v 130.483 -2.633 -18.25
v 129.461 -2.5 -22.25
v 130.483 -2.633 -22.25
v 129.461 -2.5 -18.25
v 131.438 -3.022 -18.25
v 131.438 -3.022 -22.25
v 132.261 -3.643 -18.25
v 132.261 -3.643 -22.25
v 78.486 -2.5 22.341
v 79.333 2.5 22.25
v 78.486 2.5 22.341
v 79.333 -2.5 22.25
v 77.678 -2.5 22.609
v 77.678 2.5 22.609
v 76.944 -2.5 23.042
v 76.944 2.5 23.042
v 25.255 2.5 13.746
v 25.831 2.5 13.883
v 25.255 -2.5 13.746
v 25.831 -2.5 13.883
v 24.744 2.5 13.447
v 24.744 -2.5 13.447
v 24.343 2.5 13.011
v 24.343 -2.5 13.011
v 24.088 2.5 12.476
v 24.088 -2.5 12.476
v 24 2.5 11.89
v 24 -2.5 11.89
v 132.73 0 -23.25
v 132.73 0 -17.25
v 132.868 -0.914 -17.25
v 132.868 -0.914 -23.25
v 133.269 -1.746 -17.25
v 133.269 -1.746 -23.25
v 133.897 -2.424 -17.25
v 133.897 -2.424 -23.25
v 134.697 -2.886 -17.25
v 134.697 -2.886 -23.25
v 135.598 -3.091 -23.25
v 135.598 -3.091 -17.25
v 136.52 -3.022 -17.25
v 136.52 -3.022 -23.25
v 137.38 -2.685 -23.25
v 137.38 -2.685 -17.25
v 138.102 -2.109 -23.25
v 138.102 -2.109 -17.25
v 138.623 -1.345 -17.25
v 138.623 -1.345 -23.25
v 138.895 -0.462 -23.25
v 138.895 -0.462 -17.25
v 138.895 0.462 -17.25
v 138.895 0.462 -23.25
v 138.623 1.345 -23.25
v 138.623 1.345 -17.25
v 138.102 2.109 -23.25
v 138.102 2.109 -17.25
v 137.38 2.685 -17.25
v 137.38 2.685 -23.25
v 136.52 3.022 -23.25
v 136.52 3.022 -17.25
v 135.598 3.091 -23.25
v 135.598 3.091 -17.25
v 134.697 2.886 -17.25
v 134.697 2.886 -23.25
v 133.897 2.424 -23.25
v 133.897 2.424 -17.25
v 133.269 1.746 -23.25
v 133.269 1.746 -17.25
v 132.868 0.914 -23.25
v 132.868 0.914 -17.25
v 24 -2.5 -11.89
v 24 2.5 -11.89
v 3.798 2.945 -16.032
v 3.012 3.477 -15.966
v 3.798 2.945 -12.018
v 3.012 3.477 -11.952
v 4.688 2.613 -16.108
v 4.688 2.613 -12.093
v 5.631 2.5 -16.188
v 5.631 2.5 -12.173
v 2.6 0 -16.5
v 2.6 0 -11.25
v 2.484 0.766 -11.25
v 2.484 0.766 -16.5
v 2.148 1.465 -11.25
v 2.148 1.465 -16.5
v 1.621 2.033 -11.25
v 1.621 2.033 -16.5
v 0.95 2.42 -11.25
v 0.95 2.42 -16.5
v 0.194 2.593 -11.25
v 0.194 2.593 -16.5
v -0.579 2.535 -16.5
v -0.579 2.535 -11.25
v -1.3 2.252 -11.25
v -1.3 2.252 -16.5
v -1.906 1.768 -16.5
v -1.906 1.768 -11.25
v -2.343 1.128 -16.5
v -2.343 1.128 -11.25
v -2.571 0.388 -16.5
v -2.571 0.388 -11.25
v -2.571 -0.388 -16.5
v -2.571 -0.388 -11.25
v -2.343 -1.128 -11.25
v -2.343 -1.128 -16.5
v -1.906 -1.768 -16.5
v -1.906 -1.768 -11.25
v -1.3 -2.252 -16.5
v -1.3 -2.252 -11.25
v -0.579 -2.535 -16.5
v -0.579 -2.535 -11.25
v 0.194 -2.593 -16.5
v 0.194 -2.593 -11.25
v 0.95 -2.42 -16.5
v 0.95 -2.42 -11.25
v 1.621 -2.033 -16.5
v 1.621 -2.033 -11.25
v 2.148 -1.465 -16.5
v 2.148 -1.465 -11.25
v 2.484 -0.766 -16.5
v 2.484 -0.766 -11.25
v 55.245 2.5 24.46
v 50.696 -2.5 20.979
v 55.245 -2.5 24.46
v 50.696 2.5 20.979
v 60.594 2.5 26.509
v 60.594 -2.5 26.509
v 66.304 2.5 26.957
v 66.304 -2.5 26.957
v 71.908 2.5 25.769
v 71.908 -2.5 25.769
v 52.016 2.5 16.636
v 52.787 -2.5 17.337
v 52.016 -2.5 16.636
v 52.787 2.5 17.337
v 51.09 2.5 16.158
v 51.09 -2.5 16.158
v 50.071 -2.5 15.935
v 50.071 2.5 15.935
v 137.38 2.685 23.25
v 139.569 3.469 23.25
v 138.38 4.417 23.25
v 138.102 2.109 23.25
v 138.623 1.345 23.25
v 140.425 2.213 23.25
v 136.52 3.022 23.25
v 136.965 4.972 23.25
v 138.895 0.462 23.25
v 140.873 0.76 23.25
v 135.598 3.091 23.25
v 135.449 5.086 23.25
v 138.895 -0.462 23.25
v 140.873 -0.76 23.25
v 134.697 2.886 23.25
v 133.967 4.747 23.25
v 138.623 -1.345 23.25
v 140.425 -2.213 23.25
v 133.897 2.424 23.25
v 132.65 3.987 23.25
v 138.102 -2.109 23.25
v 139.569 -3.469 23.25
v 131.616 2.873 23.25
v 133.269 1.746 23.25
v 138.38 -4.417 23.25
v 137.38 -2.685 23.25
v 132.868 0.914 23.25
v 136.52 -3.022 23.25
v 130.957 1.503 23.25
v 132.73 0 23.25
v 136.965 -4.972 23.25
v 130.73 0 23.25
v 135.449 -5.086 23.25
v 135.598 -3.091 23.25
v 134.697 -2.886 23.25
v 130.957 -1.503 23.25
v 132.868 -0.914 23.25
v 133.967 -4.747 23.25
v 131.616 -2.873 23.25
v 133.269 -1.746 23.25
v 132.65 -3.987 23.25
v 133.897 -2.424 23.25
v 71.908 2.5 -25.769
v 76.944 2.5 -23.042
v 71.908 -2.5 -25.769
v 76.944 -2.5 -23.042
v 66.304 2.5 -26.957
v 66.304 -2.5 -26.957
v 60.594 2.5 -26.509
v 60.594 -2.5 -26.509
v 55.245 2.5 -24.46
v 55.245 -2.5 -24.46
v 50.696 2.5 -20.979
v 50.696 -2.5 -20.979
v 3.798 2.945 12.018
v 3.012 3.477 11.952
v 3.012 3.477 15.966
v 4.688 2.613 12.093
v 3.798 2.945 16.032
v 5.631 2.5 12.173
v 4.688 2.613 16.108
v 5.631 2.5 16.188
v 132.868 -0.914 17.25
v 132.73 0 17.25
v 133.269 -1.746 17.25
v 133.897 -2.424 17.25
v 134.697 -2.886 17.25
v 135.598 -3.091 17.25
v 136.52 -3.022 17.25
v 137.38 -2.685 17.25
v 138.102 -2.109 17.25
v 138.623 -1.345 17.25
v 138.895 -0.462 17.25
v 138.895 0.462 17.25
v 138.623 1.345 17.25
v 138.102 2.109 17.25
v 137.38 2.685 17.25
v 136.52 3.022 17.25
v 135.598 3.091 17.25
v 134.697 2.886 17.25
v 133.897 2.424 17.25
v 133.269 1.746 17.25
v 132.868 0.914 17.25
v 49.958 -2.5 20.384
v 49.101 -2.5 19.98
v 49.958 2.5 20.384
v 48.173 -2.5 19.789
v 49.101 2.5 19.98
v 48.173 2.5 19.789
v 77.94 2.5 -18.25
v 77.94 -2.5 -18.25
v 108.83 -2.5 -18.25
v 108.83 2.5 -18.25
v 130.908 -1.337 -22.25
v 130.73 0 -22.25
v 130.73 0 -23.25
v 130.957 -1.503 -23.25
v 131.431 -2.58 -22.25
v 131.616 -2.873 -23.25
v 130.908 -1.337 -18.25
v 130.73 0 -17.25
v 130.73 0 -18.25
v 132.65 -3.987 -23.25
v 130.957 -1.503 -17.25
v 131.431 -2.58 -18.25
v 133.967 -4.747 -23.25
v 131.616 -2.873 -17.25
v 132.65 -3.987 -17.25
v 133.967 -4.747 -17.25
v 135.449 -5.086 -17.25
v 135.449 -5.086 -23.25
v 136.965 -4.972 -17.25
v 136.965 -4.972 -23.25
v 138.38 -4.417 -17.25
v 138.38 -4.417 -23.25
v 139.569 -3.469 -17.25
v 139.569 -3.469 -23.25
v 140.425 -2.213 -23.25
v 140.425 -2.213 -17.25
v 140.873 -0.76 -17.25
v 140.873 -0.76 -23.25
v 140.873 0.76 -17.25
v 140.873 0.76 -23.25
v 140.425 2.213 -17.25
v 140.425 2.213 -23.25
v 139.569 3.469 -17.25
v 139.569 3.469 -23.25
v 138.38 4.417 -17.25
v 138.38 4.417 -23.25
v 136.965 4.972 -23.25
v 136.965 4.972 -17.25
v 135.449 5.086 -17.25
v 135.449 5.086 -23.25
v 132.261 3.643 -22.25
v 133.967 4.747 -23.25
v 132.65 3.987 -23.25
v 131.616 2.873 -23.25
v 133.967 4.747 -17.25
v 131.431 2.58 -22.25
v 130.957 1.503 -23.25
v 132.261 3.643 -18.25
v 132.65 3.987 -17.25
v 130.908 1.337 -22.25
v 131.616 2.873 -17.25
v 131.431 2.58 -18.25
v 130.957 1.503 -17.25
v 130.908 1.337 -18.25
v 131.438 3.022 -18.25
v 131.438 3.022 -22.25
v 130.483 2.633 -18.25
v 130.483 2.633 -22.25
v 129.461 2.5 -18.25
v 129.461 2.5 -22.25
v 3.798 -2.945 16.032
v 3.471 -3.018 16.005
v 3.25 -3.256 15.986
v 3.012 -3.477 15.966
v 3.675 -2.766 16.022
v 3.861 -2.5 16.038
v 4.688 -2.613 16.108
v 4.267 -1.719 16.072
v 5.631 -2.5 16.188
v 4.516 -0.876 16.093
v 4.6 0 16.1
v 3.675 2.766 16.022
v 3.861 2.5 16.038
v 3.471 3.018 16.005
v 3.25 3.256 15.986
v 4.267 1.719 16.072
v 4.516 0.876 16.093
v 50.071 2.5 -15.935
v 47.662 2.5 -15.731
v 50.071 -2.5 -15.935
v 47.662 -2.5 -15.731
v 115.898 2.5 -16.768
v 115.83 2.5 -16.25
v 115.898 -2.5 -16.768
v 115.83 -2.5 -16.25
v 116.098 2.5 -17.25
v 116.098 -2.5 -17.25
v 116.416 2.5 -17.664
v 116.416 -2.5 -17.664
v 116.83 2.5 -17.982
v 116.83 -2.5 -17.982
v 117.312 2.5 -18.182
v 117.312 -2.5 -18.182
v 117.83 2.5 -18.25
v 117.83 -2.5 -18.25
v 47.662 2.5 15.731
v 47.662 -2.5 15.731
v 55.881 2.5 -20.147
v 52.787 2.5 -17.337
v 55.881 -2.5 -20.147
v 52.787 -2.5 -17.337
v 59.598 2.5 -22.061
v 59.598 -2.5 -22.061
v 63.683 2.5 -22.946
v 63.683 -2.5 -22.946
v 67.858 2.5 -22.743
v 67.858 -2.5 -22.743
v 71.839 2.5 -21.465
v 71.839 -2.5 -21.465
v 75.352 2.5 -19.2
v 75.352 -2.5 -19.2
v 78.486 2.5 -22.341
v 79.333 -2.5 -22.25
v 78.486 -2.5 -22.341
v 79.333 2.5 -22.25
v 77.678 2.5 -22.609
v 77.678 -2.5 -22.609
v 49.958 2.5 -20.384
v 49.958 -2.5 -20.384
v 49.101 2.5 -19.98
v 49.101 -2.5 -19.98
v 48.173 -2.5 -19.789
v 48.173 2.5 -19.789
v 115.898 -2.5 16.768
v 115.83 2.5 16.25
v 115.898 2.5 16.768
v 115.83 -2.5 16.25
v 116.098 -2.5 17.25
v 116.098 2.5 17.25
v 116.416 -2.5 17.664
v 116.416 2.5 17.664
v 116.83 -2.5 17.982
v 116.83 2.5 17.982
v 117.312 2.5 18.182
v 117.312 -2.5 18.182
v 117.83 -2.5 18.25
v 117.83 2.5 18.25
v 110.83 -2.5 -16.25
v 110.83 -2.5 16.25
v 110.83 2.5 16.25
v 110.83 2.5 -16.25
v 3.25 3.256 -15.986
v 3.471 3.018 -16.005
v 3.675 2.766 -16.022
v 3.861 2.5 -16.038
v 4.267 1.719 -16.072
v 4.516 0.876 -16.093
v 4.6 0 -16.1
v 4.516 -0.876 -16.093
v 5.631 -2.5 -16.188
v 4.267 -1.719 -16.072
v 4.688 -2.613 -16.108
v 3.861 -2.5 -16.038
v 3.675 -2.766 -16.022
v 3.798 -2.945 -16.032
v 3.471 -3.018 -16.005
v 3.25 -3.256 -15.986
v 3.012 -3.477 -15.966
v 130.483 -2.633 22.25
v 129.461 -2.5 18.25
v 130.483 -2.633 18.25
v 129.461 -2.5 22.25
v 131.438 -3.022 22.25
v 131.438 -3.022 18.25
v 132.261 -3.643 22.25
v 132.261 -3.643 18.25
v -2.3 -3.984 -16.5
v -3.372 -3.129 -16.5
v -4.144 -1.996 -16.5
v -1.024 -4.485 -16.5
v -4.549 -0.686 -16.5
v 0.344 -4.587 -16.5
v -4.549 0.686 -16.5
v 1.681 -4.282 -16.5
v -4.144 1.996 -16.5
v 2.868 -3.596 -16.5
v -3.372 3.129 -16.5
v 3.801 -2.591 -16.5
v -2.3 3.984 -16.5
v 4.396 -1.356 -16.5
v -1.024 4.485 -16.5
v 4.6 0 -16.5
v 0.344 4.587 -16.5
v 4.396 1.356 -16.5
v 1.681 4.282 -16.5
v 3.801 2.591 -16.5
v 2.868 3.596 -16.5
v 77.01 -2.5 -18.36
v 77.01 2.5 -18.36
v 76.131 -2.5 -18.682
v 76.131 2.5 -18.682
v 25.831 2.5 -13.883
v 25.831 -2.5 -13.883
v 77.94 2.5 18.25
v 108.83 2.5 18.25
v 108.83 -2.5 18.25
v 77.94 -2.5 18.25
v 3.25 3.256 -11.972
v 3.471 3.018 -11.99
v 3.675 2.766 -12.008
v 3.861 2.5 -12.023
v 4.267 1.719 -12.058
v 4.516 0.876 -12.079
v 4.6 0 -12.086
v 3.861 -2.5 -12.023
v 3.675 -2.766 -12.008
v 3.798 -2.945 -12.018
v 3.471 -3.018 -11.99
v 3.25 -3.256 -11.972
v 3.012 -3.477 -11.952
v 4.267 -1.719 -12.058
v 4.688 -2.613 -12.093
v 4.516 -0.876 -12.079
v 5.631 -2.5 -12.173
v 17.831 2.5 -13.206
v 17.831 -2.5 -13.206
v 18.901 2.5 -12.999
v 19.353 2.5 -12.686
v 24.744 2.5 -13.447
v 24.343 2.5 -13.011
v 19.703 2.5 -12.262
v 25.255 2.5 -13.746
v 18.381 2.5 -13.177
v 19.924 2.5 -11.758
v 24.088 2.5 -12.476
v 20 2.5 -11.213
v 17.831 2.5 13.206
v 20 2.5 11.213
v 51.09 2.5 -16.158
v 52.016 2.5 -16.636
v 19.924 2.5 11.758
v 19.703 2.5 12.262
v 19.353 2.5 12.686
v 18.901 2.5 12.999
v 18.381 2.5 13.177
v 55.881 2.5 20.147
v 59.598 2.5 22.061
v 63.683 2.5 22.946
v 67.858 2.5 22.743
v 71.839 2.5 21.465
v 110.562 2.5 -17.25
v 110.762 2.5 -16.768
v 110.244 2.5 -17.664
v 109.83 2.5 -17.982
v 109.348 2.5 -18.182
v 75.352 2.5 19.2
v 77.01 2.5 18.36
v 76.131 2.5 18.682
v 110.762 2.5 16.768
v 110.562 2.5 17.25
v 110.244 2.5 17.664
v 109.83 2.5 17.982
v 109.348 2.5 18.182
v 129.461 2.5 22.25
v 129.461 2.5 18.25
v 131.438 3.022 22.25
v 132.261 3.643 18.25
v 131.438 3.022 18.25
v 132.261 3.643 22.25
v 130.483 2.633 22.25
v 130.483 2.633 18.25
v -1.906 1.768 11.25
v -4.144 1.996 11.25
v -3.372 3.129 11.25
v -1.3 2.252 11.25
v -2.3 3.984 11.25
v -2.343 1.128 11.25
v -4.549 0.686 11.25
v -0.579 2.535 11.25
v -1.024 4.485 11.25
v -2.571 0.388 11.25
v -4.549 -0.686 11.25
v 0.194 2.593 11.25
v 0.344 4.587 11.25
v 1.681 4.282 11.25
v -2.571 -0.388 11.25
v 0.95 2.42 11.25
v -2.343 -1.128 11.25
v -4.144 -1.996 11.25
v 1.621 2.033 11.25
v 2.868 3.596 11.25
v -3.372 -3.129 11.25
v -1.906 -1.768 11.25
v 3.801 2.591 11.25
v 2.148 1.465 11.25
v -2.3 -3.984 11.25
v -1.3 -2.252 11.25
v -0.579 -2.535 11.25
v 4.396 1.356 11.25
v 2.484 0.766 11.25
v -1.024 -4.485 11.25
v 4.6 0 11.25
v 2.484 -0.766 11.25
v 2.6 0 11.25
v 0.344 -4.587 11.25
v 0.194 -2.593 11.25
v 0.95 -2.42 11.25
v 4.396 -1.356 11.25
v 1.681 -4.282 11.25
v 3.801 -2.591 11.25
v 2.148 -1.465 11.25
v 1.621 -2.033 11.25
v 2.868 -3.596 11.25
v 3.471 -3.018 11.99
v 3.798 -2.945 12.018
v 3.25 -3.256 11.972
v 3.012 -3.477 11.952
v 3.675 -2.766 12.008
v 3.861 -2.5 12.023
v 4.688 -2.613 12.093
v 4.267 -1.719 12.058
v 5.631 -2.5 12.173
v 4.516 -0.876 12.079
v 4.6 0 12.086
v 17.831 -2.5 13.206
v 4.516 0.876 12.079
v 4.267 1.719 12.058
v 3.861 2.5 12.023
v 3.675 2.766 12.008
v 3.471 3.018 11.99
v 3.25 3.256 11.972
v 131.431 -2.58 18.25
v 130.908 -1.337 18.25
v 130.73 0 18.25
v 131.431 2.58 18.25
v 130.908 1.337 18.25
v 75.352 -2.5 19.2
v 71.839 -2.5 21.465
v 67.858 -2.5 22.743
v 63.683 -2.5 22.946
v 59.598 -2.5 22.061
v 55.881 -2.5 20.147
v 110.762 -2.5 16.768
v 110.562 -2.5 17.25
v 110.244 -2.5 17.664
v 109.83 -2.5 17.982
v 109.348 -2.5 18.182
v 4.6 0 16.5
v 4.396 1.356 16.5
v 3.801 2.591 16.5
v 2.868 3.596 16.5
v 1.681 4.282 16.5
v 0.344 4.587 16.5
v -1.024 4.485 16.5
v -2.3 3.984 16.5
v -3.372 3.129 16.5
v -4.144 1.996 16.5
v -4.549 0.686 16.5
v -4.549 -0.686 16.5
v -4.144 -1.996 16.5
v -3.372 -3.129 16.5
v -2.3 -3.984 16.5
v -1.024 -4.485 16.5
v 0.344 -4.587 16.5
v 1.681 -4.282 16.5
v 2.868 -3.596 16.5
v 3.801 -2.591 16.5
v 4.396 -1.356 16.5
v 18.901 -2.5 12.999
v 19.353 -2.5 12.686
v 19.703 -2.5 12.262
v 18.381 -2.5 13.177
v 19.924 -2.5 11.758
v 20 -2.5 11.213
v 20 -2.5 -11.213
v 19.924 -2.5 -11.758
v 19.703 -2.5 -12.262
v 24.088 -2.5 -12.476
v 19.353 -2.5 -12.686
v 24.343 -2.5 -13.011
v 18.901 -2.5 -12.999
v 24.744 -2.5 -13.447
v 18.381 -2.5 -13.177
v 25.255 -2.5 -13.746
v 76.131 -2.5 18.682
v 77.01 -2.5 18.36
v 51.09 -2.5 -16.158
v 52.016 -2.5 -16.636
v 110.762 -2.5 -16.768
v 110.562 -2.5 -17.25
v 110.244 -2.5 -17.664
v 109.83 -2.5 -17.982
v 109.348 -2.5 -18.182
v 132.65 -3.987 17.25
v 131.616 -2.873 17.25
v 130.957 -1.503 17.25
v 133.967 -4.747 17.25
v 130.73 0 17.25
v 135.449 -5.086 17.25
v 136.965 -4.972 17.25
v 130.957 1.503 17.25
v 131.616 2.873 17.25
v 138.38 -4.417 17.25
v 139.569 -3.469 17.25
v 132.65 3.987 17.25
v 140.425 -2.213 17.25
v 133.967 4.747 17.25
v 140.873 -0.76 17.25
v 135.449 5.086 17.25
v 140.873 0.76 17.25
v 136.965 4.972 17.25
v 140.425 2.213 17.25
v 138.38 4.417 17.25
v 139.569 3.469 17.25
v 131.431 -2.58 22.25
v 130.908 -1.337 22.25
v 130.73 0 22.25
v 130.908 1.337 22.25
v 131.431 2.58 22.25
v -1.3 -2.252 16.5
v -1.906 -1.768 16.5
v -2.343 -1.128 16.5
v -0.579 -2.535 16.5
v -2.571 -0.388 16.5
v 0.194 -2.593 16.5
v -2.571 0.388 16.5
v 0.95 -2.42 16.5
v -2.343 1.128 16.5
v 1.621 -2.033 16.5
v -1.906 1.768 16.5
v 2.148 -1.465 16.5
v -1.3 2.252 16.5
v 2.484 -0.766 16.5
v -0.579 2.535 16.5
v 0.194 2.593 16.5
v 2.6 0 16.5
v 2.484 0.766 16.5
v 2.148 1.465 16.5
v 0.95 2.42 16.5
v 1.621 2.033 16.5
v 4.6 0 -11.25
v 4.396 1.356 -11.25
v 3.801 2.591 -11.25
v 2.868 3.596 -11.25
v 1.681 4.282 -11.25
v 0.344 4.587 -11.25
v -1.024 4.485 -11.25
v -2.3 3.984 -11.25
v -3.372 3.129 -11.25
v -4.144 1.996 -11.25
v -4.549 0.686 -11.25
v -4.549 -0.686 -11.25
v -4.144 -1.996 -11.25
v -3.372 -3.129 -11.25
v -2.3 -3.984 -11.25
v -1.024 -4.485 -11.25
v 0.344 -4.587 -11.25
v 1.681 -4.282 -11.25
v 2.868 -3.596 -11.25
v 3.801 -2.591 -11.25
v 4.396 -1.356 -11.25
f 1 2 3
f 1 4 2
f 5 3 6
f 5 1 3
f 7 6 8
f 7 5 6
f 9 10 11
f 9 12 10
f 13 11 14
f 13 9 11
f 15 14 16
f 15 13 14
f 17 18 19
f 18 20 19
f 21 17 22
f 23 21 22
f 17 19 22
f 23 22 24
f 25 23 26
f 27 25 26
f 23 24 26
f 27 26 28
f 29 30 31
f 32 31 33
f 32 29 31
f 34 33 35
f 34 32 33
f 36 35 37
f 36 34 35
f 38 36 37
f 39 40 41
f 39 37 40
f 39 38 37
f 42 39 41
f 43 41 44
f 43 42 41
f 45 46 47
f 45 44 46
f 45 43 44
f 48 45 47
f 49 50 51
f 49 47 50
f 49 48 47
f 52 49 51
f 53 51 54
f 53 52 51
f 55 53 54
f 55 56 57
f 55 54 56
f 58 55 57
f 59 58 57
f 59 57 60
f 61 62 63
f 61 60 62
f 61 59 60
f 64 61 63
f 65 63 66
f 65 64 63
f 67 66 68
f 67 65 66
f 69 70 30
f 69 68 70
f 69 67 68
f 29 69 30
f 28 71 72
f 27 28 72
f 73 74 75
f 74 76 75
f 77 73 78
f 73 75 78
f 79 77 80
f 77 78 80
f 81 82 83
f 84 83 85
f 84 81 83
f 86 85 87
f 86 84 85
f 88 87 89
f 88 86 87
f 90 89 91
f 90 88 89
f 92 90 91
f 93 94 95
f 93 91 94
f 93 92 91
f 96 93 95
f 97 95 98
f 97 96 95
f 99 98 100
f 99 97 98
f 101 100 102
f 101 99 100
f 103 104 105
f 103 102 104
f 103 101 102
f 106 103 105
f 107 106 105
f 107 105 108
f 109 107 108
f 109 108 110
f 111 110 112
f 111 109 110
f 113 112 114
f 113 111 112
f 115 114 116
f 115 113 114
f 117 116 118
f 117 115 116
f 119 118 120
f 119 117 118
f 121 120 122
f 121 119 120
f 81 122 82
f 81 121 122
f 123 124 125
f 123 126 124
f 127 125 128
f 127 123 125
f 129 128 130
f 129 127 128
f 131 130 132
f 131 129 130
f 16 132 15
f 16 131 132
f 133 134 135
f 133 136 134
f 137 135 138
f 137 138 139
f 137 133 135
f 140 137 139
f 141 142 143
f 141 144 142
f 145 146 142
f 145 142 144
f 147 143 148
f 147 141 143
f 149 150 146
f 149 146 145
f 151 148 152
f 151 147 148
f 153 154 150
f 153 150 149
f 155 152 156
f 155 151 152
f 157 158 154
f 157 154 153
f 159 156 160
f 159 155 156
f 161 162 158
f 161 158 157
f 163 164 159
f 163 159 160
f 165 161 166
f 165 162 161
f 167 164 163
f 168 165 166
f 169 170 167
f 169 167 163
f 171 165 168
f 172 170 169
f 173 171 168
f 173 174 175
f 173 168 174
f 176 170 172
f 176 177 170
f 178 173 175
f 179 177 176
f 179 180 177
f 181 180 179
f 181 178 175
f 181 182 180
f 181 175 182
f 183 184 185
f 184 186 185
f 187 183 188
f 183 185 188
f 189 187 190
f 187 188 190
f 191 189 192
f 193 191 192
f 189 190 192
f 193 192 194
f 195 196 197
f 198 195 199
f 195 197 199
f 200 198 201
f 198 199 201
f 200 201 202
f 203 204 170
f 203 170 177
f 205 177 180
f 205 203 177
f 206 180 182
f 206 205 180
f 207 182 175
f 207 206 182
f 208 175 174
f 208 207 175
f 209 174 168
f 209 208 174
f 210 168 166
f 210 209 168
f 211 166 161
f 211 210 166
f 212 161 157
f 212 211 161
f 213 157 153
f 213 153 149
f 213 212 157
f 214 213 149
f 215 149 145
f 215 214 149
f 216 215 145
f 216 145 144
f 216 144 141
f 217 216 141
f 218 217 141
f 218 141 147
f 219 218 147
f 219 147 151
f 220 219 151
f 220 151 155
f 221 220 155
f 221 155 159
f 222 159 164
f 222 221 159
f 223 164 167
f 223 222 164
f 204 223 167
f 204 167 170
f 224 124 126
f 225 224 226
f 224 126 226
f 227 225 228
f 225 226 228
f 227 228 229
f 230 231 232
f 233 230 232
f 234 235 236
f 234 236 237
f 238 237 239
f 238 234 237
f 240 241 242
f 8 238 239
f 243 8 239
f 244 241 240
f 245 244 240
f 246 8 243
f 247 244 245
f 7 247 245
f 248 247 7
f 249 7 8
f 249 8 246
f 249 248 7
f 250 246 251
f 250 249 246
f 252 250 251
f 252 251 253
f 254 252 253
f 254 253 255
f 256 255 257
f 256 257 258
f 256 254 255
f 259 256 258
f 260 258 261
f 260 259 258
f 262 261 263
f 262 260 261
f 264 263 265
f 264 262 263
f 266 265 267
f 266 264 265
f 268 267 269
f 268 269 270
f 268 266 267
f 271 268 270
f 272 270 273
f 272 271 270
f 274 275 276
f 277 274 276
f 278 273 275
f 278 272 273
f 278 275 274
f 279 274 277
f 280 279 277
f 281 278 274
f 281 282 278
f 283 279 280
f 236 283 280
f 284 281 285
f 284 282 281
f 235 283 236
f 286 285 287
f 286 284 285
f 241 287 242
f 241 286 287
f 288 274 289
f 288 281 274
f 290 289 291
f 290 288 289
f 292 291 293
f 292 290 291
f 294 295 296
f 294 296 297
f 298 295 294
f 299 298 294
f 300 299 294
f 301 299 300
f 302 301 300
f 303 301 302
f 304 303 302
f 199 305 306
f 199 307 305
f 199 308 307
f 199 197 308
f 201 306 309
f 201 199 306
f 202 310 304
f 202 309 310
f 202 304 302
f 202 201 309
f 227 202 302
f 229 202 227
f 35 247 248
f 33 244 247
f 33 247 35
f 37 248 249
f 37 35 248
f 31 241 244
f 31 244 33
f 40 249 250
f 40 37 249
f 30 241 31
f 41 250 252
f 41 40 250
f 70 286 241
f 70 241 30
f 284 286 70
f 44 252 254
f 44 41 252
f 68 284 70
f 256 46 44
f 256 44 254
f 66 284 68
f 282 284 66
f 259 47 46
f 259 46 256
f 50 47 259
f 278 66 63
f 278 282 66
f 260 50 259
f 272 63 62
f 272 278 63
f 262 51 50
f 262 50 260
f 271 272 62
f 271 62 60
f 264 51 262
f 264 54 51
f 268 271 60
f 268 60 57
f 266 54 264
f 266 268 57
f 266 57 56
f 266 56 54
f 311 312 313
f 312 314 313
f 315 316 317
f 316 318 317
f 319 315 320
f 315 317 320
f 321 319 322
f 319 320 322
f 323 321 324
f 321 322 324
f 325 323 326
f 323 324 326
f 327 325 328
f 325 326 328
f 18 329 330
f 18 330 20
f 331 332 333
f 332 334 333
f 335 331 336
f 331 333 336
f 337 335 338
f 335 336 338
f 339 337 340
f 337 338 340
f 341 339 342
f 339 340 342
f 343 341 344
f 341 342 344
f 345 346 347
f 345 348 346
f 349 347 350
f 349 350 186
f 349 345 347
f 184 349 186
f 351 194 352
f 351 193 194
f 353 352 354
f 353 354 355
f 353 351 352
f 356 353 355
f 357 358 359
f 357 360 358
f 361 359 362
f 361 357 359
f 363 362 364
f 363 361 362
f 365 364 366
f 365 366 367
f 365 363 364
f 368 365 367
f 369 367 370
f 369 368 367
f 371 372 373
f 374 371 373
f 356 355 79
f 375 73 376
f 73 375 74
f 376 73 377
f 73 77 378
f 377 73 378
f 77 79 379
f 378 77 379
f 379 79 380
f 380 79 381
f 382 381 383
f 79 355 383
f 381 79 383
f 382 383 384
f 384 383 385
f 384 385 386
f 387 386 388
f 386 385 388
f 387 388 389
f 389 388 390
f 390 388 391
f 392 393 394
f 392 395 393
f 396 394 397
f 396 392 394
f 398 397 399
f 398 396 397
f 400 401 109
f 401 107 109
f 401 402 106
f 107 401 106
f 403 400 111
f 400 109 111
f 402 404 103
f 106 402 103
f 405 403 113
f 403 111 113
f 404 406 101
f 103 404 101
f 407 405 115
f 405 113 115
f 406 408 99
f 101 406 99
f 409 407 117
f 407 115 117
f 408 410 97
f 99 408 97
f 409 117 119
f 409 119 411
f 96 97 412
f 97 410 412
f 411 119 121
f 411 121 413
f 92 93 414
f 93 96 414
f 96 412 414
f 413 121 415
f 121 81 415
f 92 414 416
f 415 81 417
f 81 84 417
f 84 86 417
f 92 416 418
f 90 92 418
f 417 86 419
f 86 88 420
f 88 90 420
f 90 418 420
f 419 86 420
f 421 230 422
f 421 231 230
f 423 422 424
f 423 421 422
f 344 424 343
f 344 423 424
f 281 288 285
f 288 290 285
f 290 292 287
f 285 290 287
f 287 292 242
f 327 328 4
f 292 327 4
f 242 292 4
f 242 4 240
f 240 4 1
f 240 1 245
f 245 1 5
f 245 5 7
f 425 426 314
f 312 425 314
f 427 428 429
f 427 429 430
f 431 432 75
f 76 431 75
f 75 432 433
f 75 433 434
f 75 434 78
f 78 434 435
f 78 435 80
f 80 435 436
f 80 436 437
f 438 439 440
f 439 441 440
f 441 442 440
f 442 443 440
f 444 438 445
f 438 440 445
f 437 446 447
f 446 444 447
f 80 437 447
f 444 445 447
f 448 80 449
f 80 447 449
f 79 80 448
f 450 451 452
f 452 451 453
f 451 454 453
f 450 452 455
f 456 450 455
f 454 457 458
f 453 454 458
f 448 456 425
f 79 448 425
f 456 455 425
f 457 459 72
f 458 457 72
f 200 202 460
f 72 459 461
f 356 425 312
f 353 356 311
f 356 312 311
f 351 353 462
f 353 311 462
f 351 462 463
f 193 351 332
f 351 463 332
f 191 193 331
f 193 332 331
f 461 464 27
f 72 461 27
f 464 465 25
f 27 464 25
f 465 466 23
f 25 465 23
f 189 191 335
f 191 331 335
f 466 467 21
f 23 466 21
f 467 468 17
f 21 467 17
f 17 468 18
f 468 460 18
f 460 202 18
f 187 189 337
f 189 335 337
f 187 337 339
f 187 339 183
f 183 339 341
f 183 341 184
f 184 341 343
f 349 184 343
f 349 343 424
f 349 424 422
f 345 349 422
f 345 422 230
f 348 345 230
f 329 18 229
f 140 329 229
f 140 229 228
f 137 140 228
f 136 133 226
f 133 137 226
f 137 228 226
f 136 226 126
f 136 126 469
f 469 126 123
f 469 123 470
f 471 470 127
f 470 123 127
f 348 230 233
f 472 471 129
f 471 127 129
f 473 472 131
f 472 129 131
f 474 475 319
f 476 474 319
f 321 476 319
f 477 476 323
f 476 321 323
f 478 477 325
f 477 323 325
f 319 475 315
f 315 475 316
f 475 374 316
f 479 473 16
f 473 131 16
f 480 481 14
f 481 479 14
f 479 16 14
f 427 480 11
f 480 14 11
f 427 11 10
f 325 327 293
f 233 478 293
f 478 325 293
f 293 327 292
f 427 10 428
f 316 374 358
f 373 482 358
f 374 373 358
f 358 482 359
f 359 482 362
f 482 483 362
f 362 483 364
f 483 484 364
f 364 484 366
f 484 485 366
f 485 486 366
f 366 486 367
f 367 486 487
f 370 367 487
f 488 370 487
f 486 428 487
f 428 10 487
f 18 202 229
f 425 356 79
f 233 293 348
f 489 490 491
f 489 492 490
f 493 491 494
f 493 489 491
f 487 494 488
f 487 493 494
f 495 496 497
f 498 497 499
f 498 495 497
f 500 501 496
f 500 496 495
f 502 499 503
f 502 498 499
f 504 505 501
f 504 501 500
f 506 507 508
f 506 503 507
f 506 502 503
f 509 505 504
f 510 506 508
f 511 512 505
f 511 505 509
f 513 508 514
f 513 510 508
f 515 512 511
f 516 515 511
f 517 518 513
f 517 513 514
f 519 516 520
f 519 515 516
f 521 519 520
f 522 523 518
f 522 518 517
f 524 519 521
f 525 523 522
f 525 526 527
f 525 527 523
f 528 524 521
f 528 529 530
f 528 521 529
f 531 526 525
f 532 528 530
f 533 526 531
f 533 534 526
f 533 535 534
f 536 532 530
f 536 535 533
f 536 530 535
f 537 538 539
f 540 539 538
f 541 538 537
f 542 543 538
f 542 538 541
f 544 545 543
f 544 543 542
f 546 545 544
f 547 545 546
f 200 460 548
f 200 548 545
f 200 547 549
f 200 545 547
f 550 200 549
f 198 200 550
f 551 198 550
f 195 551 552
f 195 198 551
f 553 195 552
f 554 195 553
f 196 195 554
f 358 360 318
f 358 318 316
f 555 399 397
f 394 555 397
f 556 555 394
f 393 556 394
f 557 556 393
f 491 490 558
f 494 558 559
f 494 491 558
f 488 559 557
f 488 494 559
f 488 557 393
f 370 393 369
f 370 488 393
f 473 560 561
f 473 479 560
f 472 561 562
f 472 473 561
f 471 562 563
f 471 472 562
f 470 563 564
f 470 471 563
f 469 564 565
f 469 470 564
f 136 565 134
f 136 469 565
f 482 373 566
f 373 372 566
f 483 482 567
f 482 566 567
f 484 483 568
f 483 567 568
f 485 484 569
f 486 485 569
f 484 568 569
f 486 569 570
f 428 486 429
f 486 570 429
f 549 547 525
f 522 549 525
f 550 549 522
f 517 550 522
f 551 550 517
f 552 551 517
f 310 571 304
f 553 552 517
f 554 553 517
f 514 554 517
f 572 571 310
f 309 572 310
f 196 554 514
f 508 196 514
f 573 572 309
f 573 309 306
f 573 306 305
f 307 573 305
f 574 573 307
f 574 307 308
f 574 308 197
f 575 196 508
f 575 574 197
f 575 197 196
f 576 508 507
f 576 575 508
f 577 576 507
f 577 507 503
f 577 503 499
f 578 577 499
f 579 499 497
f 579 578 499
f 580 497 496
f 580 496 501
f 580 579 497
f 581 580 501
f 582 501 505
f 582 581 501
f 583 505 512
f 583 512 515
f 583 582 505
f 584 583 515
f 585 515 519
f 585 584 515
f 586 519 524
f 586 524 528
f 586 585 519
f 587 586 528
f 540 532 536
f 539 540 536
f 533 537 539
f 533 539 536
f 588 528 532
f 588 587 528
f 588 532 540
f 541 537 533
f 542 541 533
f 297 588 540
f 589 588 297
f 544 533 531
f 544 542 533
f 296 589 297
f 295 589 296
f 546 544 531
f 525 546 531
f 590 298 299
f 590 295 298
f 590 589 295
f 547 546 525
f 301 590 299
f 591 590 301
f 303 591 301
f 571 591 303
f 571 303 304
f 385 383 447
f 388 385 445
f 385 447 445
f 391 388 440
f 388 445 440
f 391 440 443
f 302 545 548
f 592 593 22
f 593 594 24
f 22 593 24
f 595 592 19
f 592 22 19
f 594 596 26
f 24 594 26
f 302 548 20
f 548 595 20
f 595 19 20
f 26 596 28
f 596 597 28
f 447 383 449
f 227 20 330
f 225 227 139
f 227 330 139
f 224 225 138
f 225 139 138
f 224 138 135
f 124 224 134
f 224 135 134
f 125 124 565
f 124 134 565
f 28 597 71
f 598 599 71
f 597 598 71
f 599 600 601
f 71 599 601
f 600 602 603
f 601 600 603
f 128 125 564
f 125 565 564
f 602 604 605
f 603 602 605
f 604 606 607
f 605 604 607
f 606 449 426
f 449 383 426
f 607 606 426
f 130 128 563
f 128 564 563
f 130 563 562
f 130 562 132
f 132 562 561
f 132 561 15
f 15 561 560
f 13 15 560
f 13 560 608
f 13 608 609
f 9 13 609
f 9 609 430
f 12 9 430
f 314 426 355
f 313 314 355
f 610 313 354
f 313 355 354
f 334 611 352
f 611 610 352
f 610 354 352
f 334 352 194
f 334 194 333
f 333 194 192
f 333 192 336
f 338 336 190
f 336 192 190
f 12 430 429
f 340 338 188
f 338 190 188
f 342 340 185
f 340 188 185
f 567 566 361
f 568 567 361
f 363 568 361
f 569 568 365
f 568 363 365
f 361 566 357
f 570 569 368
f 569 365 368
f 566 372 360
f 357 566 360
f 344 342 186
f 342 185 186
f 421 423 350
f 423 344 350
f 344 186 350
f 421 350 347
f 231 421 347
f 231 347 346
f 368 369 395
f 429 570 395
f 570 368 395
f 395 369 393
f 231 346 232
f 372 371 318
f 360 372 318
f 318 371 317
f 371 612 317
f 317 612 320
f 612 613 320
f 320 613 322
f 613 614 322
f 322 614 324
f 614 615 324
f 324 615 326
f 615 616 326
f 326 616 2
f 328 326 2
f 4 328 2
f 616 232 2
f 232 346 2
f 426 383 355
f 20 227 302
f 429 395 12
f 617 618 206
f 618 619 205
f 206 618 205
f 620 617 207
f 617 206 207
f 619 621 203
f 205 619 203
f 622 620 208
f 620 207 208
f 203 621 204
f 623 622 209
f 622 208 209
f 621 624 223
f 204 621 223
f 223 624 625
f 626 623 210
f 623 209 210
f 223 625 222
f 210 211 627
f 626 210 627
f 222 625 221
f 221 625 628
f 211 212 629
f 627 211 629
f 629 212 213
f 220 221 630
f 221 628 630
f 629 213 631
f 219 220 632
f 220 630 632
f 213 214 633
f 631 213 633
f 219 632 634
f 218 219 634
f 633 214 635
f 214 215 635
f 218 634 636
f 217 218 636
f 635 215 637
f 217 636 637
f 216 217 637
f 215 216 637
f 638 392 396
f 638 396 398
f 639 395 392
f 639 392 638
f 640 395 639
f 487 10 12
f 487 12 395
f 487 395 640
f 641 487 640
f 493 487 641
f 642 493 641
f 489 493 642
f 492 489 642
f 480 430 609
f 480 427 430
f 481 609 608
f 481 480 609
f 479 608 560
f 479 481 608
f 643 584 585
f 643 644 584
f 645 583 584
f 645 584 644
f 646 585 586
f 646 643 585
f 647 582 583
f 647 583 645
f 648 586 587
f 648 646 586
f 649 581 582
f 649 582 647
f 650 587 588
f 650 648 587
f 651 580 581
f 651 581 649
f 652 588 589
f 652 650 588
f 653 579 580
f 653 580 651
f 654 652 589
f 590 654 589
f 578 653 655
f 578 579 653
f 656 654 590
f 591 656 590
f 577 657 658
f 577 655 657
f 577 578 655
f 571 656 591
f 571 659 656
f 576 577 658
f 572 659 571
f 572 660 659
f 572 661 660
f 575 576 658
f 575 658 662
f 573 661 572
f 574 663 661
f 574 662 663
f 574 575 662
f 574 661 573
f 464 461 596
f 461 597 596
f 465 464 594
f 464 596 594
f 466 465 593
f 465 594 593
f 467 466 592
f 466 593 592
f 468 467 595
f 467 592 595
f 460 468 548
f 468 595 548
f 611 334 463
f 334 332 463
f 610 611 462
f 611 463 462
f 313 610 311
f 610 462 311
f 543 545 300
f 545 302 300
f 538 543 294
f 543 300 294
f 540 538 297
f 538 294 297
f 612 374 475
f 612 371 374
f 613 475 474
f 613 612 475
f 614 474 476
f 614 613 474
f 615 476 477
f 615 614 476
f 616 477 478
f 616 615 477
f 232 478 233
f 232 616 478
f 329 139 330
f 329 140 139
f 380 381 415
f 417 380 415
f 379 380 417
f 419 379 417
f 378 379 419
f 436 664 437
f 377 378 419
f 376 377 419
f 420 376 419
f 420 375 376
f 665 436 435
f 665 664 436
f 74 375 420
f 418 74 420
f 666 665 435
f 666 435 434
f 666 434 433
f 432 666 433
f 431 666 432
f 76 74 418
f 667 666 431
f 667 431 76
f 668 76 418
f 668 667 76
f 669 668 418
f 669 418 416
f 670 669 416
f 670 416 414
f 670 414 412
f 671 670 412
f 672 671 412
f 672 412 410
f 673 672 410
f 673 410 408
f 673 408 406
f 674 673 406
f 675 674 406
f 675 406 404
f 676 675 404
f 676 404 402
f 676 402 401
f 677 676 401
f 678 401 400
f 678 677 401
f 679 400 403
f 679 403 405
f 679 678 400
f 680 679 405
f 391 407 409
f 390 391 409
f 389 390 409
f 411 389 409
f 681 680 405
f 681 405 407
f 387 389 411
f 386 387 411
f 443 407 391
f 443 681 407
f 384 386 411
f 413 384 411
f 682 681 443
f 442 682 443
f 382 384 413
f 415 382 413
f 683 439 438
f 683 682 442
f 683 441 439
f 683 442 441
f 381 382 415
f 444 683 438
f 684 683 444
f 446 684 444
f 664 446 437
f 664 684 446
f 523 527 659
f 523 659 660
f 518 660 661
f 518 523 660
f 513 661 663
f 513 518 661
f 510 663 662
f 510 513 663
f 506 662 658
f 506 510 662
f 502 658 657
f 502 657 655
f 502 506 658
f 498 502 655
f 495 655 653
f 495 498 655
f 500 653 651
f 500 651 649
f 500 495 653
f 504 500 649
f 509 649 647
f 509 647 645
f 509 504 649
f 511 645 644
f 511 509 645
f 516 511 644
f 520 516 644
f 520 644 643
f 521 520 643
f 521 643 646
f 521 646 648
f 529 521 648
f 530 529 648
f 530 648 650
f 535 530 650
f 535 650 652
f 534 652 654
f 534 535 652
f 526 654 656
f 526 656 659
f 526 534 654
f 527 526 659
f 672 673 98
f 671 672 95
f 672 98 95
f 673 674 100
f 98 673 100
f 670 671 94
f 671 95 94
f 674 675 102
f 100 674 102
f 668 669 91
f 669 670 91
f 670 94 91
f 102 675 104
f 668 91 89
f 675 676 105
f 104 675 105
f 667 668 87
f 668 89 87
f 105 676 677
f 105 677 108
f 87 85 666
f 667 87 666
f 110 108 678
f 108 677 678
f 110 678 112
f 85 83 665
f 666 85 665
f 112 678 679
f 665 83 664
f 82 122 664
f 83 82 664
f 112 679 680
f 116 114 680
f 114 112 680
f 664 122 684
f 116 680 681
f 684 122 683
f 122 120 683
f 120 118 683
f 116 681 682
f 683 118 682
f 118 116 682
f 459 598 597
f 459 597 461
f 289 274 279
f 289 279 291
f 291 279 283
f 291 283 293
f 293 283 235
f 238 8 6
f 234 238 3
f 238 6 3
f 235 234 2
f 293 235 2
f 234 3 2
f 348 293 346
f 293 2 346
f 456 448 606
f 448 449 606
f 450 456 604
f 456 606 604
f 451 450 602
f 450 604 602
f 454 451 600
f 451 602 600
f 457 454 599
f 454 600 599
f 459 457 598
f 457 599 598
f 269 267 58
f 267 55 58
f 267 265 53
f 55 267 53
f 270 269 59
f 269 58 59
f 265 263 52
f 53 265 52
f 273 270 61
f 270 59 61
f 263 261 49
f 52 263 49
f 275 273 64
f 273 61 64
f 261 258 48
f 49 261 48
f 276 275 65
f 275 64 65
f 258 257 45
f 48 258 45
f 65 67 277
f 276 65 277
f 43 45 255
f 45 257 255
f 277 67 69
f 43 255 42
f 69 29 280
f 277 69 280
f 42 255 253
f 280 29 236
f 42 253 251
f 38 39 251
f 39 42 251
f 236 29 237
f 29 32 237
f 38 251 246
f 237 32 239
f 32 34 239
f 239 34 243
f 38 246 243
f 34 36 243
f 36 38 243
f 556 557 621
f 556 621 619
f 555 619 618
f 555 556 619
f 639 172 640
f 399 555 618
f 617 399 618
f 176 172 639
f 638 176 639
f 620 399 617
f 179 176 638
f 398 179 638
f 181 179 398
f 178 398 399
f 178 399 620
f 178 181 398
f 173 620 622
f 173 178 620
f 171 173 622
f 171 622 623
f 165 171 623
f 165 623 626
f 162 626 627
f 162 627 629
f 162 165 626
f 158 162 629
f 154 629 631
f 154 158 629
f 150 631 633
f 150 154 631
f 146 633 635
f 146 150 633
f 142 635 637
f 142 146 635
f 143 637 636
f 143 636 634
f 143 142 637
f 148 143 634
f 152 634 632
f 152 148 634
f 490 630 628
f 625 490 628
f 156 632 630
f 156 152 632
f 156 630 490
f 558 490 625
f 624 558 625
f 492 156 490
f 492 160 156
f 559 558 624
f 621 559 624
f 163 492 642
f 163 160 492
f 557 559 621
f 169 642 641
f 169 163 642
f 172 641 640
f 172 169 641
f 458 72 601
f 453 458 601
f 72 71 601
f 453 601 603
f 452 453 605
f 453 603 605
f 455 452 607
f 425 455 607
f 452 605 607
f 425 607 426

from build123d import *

# Parameters (mm, degrees)
SKETCH_1_R          = 4.6
SKETCH_1_R_2        = 2.6
EXTRUDE_1_DEPTH     = 16.5
SKETCH_2_R          = 5.1
SKETCH_2_R_2        = 3.1
EXTRUDE_2_DEPTH     = 23.25
EXTRUDE_3_DEPTH     = 2.5
SKETCH_4_W          = 4
SKETCH_4_H          = 5
EXTRUDE_4_DEPTH     = 14
SKETCH_5_W          = 5
SKETCH_5_H          = 5
EXTRUDE_5_DEPTH     = 21
SKETCH_7_W          = 23.250119988
SKETCH_7_H          = 22.5
SKETCH_7_W_2        = 28.223053091
SKETCH_7_H_2        = 34.5
CUT_EXTRUDE_1_DEPTH = 21
FILLET_1_R          = 2
FILLET_2_R          = 4
FILLET_3_R          = 4


with BuildPart() as part:
    # 草图1 → 凸台-拉伸1 (new, symmetric)
    with BuildSketch(Plane.XY):
        Circle(SKETCH_1_R)
        Circle(SKETCH_1_R_2, mode=Mode.SUBTRACT)
    extrude(amount=EXTRUDE_1_DEPTH, both=True)



with BuildPart() as body_2:
    # 草图2 → 凸台-拉伸2 (new, symmetric)
    with BuildSketch(Plane.XY):
        with Locations(Location((135.83, 0, 0), (0, 0, 180))):
            Circle(SKETCH_2_R)
        with Locations(Location((135.83, 0, 0), (0, 0, 180))):
            Circle(SKETCH_2_R_2, mode=Mode.SUBTRACT)
    extrude(amount=EXTRUDE_2_DEPTH, both=True)


with BuildPart() as part_1:
    add(part.part)

    add(body_2.part)  # 凸台-拉伸3 merges body 2
    # 草图3 → 凸台-拉伸3 (add, symmetric)
    with BuildSketch(Plane(origin=(0, 0, 0), x_dir=(1, 0, 0), z_dir=(0, 1, 0))):
        with BuildLine():
            Line((132.183492931, 22.25), (77.939764295, 22.25))
            ThreePointArc((77.939764295, 22.25), (63.354138409, 26.932163446), (49.734070133, 19.920966887))
            Line((49.734070133, 19.920966887), (3.331299064, 15.992872298))
            Line((3.331299064, 15.992872298), (3.668700936, 12.007127702))
            Line((3.668700936, 12.007127702), (47.661946379, 15.731250754))
            Line((47.661946379, 15.731250754), (51.828770684, 16.083981413))
            ThreePointArc((51.828770684, 16.083981413), (63.593703521, 22.938077996), (76.377060253, 18.25))
            Line((76.377060253, 18.25), (81.535945694, 18.25))
            Line((81.535945694, 18.25), (132.183492931, 18.25))
            Line((132.183492931, 18.25), (132.183492931, 22.25))
        make_face()
        with BuildLine():
            Line((132.183492931, -18.25), (81.535945694, -18.25))
            Line((81.535945694, -18.25), (76.377060253, -18.25))
            ThreePointArc((76.377060253, -18.25), (63.593703521, -22.938077996), (51.828770684, -16.083981413))
            Line((51.828770684, -16.083981413), (47.661946379, -15.731250754))
            Line((47.661946379, -15.731250754), (3.668700936, -12.007127702))
            Line((3.668700936, -12.007127702), (3.331299064, -15.992872298))
            Line((3.331299064, -15.992872298), (49.734070133, -19.920966887))
            ThreePointArc((49.734070133, -19.920966887), (63.354138409, -26.932163446), (77.939764295, -22.25))
            Line((77.939764295, -22.25), (132.183492931, -22.25))
            Line((132.183492931, -22.25), (132.183492931, -18.25))
        make_face()
    extrude(amount=EXTRUDE_3_DEPTH, both=True)

    # 草图4 → 凸台-拉伸4 (add, symmetric)
    with BuildSketch(Plane.XY):
        with Locations((22, 0)):
            Rectangle(SKETCH_4_W, SKETCH_4_H)
    extrude(amount=EXTRUDE_4_DEPTH, both=True)

    # 草图5 → 凸台-拉伸5 (add, symmetric)
    with BuildSketch(Plane.XY):
        with Locations((113.33, 0)):
            Rectangle(SKETCH_5_W, SKETCH_5_H)
    extrude(amount=EXTRUDE_5_DEPTH, both=True)

    # 草图7 → 切除-拉伸1 (cut, symmetric)
    with BuildSketch(Plane(origin=(0, 0, 0), x_dir=(1, 0, 0), z_dir=(0, 1, 0))):
        Rectangle(SKETCH_7_W, SKETCH_7_H)
        with Locations((131.320513742, 0)):
            Rectangle(SKETCH_7_W_2, SKETCH_7_H_2)
    extrude(amount=CUT_EXTRUDE_1_DEPTH, both=True, mode=Mode.SUBTRACT)

    # 圆角1
    fillet_1_edges = [part_1.edges().sort_by_distance(p)[0] for p in [
        (115.83, 0, 18.25),
        (110.83, 0, 18.25),
        (110.83, 0, -18.25),
        (115.83, 0, -18.25),
        (24, 0, 13.728215991),
        (20, 0, 13.38960737),
        (20, 0, -13.38960737),
        (24, 0, -13.728215991),
    ]]
    fillet(fillet_1_edges, radius=FILLET_1_R)

    # 圆角2
    fillet_2_edges = [part_1.edges().sort_by_distance(p)[0] for p in [
        (51.828770684, 0, -16.083981413),
        (76.377060253, 0, -18.25),
        (77.939764295, 0, -22.25),
        (49.734070133, 0, -19.920966887),
        (76.377060253, 0, 18.25),
        (51.828770684, 0, 16.083981413),
        (49.734070133, 0, 19.920966887),
        (77.939764295, 0, 22.25),
    ]]
    fillet(fillet_2_edges, radius=FILLET_2_R)

    # 圆角3
    fillet_3_edges = [part_1.edges().sort_by_distance(p)[0] for p in [
        (131.384777846, -2.5, -20.25),
        (131.384777846, 2.5, -20.25),
        (131.384777846, -2.5, 20.25),
        (131.384777846, 2.5, 20.25),
        (3.861346915, 2.5, 14.030588795),
        (3.861346915, -2.5, 14.030588795),
        (3.861346915, -2.5, -14.030588795),
        (3.861346915, 2.5, -14.030588795),
    ]]
    fillet(fillet_3_edges, radius=FILLET_3_R)


solid = part_1.part
